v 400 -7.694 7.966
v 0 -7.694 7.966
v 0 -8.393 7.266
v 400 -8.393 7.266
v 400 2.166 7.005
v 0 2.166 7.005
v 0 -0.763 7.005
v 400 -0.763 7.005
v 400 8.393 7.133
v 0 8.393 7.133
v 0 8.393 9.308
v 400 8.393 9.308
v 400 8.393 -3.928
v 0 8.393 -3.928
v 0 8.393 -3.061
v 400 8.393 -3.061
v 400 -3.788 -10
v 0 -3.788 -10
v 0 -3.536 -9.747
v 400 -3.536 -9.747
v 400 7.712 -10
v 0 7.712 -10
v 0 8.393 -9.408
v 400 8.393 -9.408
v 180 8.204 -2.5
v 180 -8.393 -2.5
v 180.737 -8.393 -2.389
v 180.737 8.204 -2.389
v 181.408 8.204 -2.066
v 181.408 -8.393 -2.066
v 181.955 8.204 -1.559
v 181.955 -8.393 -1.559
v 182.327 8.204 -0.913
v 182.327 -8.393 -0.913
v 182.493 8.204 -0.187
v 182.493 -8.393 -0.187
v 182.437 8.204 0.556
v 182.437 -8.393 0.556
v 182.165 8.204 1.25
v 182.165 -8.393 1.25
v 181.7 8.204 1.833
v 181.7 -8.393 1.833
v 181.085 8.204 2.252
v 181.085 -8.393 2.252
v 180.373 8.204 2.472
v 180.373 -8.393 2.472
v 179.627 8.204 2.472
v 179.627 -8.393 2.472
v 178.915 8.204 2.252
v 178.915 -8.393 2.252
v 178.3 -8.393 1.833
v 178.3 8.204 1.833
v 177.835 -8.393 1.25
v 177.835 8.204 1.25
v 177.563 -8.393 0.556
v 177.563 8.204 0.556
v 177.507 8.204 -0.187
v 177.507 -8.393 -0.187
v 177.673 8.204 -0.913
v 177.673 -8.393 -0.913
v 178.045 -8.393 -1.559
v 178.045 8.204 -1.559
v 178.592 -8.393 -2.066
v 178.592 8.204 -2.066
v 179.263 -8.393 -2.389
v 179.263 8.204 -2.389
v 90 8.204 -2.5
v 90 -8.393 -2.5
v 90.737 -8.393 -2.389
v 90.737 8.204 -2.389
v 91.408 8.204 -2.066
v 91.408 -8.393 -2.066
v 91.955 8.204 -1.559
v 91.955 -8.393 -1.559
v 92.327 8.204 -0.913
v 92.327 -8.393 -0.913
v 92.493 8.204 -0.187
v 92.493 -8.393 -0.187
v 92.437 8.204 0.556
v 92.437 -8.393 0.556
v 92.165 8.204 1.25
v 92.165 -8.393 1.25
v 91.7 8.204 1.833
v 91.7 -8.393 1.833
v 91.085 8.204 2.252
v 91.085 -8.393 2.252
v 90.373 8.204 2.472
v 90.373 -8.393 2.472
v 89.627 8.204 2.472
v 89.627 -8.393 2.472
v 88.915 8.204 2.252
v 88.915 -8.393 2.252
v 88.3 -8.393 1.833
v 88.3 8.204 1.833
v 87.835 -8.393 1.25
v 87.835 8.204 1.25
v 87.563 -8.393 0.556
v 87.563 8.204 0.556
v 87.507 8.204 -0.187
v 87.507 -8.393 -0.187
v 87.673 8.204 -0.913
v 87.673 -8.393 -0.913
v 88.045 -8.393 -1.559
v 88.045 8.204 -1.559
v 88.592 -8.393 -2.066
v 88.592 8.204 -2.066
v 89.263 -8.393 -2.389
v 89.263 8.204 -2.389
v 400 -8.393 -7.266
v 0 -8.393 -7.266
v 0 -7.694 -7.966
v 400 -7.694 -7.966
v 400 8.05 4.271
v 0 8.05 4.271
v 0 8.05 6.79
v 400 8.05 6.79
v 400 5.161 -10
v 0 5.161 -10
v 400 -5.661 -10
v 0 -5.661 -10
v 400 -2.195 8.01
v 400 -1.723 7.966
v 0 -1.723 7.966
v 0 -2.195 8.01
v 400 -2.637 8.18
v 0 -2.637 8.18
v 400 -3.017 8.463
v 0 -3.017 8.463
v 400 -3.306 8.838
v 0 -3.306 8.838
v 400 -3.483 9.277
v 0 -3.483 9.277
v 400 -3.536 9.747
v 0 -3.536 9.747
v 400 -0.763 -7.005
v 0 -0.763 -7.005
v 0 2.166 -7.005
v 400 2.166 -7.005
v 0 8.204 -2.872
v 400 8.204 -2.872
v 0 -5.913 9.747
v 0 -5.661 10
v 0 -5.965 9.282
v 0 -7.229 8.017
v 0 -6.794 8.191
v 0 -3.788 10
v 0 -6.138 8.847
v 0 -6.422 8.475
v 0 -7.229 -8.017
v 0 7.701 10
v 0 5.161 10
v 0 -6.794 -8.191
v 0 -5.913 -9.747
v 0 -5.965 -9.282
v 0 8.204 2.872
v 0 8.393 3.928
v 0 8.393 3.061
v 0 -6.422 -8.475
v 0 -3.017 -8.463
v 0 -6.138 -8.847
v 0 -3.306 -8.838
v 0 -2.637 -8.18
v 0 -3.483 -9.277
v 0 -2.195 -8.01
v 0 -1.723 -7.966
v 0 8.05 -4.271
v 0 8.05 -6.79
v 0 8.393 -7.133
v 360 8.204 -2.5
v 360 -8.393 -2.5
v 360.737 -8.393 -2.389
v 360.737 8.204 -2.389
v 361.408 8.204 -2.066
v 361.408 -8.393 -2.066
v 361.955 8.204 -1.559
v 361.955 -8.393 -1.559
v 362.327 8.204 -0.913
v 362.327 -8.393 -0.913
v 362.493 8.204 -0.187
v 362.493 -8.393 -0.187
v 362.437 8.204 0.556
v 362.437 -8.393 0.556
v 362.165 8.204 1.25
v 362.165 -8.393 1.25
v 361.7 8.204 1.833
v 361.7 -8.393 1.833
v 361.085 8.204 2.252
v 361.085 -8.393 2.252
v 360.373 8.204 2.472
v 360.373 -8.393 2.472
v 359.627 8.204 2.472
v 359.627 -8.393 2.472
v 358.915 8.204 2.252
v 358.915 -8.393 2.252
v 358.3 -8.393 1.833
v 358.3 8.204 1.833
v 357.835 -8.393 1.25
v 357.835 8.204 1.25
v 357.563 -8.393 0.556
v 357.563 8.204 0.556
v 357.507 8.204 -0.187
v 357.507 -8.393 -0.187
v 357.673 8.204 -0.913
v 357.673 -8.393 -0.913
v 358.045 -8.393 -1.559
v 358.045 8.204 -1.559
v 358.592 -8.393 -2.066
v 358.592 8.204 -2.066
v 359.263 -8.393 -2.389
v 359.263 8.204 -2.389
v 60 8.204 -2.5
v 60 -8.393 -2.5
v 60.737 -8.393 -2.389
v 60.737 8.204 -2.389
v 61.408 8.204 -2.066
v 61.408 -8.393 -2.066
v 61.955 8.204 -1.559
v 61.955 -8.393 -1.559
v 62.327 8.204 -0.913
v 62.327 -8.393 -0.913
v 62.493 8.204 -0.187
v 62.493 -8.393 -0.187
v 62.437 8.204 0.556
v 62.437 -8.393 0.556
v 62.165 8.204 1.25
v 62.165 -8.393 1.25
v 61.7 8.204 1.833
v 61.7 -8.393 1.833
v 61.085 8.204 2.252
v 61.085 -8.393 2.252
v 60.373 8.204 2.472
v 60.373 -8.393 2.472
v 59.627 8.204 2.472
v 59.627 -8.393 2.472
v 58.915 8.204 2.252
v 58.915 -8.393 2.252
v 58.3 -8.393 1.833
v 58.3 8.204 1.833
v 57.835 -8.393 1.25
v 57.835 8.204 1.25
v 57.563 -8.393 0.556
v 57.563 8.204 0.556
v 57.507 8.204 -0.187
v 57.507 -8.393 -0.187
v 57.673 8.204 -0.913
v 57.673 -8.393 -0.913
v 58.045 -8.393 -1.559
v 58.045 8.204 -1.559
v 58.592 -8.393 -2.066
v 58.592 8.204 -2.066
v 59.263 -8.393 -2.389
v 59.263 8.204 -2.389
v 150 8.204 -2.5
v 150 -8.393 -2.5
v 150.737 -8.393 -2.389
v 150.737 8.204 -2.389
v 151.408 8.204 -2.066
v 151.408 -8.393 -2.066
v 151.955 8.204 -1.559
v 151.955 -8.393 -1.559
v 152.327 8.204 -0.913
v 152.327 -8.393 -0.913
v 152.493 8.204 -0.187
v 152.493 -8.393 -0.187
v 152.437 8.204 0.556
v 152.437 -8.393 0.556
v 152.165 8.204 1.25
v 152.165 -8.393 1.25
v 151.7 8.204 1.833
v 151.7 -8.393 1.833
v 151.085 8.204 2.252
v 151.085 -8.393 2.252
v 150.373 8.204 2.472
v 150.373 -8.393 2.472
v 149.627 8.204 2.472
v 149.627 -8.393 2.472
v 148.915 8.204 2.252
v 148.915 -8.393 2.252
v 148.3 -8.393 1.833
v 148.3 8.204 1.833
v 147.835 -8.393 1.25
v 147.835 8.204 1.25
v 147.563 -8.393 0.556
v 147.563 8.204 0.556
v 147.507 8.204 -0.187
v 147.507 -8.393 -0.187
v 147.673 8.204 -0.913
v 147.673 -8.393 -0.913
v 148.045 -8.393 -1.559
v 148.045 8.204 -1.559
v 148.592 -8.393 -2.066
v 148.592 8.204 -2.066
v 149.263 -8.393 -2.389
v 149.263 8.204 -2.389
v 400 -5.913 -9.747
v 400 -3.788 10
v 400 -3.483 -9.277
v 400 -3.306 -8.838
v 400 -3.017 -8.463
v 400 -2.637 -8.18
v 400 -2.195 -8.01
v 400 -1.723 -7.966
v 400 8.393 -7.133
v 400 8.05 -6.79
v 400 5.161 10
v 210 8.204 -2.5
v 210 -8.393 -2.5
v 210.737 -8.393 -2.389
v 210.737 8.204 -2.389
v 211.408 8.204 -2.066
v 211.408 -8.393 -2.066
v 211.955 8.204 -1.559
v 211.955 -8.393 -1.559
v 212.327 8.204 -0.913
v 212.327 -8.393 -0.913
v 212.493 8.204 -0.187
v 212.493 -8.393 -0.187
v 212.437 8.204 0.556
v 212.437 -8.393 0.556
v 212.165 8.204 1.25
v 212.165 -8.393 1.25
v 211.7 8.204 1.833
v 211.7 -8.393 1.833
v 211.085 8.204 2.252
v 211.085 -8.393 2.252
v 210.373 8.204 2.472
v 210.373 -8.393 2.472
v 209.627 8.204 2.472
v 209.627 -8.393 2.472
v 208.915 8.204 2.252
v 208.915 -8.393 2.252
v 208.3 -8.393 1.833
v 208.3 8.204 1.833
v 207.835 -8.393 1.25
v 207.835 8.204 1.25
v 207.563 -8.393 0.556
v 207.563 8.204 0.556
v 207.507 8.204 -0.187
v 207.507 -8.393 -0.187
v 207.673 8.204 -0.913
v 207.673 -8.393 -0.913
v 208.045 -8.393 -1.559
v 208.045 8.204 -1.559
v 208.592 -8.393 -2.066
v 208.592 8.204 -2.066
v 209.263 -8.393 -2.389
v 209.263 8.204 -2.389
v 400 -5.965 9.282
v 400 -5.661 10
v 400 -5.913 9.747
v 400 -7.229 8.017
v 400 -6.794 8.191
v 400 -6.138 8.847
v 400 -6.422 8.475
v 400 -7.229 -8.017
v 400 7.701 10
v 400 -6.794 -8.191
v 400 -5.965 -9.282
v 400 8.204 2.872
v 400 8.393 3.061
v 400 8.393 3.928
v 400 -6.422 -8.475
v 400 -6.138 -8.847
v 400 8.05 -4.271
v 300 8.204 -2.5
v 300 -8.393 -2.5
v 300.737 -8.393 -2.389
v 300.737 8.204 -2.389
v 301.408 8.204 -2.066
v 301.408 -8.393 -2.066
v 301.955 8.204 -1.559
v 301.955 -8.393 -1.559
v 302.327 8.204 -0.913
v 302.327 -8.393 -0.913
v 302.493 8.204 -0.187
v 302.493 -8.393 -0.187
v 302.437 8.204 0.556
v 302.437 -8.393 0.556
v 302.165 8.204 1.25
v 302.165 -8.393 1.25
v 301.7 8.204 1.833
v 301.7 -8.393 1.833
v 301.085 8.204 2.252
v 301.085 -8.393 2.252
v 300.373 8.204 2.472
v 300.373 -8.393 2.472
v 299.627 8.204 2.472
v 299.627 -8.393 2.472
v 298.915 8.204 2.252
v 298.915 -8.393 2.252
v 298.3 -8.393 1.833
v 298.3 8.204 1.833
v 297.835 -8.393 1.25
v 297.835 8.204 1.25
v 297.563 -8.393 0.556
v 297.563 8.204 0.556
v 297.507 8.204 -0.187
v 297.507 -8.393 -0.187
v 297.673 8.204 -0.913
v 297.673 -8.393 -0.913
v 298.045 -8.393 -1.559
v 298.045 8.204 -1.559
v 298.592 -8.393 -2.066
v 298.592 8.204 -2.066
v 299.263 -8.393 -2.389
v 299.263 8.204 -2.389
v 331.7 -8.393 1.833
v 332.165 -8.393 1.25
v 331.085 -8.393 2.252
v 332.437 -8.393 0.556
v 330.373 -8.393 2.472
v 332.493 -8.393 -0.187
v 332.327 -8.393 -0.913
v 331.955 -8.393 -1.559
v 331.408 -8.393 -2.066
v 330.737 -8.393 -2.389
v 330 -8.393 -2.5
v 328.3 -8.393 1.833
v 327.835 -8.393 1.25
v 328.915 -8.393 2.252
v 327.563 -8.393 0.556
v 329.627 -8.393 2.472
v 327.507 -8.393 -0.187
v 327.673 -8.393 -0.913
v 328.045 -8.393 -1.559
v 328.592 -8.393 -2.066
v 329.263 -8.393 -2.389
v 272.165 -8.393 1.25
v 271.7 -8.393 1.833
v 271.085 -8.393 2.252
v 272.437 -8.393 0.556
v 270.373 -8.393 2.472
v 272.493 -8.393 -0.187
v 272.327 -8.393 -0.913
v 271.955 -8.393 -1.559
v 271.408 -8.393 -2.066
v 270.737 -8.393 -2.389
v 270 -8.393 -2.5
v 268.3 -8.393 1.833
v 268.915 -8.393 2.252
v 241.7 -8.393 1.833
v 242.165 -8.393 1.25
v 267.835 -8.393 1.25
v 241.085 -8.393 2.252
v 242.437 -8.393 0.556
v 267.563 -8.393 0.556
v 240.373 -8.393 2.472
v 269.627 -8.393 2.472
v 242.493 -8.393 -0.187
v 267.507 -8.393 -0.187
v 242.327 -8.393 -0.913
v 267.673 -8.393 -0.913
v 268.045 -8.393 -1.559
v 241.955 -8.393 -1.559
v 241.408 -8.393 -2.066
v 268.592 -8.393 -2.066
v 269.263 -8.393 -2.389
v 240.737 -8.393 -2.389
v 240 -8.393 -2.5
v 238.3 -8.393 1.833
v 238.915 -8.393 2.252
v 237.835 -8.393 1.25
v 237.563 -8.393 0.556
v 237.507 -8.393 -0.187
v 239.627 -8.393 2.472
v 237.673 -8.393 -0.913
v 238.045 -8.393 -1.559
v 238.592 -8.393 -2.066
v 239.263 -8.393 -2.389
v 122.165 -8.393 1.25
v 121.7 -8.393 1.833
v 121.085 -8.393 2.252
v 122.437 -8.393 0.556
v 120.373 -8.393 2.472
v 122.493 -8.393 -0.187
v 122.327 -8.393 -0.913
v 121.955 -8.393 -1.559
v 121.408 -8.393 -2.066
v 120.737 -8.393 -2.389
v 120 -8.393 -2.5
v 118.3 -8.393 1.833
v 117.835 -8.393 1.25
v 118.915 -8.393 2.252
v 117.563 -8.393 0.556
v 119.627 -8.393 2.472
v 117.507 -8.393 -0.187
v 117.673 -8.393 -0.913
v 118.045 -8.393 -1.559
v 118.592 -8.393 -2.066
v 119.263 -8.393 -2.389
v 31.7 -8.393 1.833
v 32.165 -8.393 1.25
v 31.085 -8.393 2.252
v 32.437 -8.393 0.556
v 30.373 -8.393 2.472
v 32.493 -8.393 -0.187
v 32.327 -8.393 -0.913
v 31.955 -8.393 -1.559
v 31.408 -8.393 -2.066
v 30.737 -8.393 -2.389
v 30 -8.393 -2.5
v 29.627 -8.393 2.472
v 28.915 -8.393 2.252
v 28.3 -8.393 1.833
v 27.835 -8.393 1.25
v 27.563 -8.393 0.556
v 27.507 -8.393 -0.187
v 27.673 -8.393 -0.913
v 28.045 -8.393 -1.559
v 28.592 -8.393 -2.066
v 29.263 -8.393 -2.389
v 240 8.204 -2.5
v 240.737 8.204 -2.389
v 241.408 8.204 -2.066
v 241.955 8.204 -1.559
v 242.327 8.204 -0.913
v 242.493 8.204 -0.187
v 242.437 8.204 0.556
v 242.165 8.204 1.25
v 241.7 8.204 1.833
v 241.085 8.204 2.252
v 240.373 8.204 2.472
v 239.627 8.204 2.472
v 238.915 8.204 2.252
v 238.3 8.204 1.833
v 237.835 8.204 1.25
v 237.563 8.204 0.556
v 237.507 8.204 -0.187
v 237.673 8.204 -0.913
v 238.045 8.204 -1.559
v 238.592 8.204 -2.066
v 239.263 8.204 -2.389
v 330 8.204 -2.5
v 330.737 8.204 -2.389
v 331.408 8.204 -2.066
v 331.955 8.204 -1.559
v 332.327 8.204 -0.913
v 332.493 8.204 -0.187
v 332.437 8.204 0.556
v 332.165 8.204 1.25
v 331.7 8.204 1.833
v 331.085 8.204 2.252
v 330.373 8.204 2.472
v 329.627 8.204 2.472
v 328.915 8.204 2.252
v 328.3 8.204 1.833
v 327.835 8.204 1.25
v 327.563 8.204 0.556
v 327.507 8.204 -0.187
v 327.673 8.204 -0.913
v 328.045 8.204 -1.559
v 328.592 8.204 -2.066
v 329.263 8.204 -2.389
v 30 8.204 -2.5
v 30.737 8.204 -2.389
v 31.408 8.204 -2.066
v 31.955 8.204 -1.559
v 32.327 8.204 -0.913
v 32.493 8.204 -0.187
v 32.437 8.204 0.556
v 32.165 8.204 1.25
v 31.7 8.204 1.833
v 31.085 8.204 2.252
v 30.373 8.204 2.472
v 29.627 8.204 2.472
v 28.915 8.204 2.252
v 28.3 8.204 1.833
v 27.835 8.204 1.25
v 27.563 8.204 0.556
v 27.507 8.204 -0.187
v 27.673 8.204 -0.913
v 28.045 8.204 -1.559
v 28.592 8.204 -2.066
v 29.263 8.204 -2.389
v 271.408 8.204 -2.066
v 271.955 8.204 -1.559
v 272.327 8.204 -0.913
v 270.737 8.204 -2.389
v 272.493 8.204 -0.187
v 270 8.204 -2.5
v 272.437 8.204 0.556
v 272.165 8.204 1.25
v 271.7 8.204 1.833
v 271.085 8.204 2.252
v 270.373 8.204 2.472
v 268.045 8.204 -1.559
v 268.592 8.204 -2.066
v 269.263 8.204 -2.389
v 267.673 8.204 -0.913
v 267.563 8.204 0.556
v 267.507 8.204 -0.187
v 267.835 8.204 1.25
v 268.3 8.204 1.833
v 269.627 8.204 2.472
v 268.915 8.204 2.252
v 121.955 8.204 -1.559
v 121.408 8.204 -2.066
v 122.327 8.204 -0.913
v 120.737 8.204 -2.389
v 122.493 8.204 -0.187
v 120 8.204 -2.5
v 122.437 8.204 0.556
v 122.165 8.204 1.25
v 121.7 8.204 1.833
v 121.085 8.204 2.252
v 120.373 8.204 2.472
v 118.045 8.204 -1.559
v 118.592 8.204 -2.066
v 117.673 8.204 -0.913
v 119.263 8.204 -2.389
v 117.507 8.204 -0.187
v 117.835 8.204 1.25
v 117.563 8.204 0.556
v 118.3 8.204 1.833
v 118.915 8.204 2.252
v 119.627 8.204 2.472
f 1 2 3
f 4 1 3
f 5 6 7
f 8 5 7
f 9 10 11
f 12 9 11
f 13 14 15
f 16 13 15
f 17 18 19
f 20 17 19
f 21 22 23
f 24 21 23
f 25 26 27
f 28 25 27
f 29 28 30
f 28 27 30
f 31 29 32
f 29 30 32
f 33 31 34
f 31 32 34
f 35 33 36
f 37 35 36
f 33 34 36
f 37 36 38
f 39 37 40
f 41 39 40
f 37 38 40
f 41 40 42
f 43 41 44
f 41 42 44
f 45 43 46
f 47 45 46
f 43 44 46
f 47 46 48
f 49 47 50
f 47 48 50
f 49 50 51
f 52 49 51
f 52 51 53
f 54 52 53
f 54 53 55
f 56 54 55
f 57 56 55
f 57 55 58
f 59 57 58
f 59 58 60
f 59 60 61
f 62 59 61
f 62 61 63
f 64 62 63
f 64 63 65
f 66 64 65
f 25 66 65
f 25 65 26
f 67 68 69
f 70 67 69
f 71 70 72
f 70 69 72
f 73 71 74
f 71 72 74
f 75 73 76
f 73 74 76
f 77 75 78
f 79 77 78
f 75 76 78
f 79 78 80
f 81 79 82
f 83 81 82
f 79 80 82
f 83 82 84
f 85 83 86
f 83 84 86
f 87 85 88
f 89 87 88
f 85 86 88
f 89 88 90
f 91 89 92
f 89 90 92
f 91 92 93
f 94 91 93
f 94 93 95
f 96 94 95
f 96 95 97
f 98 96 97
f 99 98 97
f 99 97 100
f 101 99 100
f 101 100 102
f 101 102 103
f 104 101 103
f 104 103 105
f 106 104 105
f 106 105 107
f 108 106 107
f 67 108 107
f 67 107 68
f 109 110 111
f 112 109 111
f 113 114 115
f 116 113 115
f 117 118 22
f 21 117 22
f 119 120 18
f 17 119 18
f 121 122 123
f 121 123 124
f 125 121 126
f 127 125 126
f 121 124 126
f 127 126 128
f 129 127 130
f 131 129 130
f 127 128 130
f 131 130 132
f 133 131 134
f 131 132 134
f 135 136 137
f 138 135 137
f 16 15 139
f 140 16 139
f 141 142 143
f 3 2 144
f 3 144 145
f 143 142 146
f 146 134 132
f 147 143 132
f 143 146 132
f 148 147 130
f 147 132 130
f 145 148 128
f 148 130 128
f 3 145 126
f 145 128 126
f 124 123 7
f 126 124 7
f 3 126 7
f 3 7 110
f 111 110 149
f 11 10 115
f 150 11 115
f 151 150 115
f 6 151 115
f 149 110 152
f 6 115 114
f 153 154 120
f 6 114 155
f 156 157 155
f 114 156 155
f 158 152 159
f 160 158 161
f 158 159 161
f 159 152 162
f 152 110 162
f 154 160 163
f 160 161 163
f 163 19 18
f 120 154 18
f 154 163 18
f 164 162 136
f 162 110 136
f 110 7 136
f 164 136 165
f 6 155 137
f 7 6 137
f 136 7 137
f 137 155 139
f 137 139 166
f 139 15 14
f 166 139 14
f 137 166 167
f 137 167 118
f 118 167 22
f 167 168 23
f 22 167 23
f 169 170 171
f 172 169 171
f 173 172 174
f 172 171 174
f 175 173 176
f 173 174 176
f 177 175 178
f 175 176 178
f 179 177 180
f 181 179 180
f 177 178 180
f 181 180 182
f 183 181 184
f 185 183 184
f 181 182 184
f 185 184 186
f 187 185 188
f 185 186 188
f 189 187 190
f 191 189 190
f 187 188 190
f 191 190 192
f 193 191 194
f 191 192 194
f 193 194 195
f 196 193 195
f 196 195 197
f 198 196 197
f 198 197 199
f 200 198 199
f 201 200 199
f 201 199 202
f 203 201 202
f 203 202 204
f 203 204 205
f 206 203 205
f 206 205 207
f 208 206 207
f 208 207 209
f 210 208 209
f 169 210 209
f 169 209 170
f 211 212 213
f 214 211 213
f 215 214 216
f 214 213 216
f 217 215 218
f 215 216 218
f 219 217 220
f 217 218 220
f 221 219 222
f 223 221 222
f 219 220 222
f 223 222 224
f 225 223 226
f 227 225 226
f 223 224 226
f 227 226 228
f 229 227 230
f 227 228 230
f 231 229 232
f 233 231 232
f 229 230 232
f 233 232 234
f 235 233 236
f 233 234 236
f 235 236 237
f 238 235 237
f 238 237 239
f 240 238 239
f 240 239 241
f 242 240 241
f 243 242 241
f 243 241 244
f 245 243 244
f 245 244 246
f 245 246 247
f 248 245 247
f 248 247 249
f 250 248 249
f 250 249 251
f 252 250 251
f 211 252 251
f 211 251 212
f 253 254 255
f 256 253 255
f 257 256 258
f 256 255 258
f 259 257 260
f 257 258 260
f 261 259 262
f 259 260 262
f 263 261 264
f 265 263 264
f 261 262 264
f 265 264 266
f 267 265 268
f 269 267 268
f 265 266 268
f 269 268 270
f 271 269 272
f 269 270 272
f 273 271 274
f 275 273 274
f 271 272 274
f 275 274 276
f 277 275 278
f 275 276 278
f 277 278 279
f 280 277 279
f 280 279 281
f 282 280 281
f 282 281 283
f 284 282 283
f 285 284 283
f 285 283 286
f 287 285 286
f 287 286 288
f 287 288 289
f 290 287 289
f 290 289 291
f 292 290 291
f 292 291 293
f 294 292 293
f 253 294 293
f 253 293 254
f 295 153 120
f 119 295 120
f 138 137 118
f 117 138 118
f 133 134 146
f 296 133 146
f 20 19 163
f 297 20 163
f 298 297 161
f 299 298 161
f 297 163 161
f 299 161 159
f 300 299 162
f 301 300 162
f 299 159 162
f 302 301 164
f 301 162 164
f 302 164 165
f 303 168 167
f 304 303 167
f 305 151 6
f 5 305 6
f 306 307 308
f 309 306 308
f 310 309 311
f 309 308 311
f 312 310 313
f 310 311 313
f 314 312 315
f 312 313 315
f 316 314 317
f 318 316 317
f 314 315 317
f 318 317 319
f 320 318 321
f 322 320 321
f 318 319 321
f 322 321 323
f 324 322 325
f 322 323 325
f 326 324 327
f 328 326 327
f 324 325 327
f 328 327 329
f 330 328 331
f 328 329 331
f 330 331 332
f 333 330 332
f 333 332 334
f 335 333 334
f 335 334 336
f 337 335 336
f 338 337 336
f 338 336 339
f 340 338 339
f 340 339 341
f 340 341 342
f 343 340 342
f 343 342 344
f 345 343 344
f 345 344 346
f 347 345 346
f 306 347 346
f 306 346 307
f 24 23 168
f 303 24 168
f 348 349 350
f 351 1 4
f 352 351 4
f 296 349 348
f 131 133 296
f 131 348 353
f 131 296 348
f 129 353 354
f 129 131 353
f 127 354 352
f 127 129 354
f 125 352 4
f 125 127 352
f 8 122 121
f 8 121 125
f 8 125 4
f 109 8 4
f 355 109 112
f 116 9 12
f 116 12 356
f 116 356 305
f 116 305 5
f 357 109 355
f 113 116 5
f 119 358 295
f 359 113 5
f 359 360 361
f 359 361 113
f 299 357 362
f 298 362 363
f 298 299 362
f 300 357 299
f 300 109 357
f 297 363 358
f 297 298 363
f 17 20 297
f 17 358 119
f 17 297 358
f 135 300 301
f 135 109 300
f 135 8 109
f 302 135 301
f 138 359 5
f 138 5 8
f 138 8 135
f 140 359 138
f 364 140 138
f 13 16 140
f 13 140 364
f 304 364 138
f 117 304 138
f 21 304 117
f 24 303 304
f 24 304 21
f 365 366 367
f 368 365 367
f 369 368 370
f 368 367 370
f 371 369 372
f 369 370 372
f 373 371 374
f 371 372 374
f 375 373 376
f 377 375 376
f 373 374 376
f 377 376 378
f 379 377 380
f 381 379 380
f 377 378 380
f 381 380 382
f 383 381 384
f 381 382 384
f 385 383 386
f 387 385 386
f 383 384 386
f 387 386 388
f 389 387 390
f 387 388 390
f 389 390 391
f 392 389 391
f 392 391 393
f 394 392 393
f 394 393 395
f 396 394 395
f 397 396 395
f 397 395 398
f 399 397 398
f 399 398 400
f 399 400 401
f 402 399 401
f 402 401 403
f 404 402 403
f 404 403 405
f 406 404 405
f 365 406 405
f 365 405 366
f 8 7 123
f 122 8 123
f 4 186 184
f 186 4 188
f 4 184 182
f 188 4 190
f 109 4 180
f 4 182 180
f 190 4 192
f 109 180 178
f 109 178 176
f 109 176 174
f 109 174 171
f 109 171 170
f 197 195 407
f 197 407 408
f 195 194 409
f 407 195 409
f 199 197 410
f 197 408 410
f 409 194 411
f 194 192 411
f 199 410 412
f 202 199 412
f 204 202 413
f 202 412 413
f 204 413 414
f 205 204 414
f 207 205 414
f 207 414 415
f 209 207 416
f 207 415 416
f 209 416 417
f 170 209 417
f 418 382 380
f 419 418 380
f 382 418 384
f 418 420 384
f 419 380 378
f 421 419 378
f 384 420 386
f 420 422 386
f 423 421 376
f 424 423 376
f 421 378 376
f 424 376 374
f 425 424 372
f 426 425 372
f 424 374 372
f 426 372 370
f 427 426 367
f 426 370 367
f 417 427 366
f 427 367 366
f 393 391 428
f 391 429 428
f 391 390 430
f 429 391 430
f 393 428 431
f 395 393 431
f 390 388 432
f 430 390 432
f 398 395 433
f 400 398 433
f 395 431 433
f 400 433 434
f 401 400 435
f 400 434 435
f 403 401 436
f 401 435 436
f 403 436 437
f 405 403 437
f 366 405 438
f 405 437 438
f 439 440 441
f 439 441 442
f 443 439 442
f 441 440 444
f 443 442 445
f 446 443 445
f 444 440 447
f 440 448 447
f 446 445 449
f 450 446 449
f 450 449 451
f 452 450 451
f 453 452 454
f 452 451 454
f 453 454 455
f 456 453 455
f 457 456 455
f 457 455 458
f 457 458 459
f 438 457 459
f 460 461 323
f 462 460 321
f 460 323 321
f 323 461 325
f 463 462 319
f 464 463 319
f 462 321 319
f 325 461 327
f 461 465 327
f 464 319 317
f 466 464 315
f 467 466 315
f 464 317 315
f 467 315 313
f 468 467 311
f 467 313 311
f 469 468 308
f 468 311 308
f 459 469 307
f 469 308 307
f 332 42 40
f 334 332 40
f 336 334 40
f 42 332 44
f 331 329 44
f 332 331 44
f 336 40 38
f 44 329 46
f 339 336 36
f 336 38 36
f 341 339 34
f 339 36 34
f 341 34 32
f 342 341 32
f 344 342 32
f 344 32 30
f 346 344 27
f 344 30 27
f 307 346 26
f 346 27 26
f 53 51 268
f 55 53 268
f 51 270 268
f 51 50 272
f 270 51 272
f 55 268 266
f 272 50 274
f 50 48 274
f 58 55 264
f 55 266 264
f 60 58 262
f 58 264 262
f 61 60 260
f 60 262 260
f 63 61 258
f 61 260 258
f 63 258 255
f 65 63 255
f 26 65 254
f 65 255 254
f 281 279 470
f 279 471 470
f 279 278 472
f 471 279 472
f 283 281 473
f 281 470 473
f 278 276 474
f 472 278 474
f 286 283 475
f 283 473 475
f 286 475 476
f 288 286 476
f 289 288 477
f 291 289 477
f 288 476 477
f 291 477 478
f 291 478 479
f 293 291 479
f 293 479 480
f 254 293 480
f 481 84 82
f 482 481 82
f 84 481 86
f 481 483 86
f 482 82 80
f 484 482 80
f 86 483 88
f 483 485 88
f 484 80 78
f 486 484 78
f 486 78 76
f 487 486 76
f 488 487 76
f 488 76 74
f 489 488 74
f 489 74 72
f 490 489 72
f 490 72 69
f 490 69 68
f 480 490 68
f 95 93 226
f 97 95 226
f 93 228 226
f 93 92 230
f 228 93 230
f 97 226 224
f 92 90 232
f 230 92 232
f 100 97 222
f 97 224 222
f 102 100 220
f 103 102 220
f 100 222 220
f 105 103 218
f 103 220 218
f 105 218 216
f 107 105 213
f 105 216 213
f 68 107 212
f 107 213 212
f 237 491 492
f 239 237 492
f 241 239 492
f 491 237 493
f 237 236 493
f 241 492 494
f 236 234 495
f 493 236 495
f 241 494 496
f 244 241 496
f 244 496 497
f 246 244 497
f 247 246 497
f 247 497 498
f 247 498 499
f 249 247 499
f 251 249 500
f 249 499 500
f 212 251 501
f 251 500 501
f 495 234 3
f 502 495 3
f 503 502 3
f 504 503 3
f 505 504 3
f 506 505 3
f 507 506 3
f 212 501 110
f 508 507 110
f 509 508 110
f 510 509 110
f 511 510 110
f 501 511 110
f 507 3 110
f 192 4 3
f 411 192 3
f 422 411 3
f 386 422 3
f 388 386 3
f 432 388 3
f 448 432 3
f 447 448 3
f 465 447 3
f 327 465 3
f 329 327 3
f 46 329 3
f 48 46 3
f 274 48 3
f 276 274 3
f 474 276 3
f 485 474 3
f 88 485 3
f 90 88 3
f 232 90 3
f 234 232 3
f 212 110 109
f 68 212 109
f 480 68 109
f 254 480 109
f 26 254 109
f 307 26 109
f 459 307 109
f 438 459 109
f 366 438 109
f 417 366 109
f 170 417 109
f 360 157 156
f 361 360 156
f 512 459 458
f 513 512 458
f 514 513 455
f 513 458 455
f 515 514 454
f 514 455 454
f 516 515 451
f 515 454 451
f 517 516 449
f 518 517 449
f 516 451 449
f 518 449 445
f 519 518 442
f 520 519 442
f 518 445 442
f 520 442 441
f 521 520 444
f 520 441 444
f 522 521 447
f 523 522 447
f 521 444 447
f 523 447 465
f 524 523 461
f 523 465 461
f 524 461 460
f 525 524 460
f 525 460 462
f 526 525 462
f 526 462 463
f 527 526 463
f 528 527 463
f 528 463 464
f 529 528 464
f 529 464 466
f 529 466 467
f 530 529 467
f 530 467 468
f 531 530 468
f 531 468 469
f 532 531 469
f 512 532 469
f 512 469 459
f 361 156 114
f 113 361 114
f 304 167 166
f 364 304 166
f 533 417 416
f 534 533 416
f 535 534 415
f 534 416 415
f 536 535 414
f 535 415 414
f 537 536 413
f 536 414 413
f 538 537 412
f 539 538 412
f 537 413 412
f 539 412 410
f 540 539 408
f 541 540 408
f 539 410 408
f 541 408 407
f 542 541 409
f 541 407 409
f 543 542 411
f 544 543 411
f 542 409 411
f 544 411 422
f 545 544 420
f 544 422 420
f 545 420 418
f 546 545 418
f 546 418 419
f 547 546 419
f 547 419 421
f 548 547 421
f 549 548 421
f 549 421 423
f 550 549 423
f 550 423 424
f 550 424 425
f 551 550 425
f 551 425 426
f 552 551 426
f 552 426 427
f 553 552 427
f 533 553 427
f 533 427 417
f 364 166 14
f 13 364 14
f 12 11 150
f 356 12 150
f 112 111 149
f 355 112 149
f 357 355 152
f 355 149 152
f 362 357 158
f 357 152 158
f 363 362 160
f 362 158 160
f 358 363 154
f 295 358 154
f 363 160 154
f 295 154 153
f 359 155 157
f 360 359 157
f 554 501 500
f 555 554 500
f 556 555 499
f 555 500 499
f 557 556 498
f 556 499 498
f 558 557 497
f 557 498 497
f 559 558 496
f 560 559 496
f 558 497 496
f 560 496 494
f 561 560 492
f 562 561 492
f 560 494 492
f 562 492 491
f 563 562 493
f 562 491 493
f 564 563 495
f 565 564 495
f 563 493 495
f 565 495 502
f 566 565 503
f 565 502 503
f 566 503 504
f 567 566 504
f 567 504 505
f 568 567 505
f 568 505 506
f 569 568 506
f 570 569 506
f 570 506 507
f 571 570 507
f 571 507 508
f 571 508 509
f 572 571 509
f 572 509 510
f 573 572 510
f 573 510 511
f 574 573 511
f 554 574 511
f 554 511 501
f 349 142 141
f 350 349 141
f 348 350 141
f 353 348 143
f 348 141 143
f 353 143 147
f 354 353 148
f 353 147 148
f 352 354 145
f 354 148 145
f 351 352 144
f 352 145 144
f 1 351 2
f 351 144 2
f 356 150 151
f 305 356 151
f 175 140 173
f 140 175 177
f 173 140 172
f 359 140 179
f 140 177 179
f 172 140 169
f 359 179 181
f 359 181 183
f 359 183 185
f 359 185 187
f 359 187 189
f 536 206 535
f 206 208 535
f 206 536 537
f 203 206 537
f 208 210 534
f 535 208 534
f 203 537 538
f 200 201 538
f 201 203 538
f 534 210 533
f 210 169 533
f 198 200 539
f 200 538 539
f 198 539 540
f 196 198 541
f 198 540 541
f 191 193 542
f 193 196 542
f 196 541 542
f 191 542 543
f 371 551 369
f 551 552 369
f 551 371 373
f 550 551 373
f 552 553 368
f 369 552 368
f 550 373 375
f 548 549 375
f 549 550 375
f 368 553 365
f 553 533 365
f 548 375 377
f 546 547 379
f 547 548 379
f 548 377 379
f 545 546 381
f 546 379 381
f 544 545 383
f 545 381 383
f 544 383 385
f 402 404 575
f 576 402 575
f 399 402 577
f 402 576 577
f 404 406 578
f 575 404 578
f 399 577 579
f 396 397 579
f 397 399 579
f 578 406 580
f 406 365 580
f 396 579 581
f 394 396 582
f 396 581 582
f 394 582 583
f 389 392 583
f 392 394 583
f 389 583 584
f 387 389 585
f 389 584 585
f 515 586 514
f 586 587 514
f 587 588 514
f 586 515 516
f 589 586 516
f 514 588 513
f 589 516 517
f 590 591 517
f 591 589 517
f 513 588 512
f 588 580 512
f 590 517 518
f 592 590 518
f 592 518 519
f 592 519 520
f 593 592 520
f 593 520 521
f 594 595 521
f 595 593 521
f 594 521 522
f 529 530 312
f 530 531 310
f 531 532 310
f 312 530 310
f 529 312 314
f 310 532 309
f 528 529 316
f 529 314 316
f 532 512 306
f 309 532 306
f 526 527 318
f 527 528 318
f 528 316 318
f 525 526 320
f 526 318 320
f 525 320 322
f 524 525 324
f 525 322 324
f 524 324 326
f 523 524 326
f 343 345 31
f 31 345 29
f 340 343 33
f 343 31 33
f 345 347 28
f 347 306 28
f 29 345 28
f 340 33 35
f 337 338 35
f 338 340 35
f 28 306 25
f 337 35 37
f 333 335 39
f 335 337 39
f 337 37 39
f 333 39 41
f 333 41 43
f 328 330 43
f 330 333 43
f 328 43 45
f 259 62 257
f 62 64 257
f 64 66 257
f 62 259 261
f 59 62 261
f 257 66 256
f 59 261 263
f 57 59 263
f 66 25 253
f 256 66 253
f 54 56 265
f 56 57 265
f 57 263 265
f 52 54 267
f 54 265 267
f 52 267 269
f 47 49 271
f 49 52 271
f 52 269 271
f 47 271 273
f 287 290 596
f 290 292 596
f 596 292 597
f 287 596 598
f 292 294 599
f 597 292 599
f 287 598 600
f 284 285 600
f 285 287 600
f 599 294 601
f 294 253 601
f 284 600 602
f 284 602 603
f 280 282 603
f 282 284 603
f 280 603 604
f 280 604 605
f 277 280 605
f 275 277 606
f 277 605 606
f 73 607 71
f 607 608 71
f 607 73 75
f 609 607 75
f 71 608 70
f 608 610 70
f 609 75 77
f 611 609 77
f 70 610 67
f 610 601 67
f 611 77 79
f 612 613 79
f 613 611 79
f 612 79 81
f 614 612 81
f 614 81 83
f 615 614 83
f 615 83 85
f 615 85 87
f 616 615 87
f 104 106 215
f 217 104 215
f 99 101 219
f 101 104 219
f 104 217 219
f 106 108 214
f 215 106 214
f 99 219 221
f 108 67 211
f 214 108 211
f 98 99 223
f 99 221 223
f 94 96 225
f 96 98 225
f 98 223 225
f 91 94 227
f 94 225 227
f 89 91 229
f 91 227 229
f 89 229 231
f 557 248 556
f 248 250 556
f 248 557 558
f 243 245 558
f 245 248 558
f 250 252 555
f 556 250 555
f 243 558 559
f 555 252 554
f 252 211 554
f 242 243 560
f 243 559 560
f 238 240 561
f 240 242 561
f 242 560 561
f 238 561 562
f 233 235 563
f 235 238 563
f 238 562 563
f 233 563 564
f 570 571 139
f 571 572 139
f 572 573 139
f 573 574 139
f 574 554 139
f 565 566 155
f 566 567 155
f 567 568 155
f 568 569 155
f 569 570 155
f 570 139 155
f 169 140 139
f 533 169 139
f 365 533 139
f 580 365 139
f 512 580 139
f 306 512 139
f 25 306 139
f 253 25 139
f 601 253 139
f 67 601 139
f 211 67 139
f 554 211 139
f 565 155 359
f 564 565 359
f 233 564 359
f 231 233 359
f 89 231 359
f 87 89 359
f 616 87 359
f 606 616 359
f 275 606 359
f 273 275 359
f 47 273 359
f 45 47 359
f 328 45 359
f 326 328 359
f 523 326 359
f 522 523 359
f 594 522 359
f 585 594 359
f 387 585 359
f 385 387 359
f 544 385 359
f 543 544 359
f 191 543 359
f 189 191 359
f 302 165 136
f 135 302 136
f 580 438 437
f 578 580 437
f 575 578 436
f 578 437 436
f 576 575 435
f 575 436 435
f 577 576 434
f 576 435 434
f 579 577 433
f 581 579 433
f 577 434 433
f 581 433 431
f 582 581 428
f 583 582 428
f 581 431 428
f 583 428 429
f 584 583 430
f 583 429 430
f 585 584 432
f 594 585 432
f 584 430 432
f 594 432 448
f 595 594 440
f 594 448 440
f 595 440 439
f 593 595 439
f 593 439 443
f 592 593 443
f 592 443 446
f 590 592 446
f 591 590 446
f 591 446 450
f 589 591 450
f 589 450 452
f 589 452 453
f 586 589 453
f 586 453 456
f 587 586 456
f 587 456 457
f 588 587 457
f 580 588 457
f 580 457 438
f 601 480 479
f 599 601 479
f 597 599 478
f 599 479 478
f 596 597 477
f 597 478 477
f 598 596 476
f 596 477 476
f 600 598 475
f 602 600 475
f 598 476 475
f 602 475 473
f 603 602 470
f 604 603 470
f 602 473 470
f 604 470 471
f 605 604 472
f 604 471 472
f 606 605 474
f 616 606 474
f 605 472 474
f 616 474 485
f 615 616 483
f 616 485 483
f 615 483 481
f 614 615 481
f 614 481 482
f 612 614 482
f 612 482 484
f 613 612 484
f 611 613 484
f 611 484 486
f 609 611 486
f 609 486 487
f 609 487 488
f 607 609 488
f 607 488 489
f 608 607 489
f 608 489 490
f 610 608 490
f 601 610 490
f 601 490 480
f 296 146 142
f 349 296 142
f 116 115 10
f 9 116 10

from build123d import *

# Parameters (mm, degrees)
BOSS_EXTRUDE1_DEPTH   = 400
CROQUIS1_R            = 2.5
CORTAR_EXTRUIR1_DEPTH = 401.476966357


with BuildPart() as part:
    # Sketch1 → Boss-Extrude1 (new body)
    with BuildSketch(Plane(origin=(0, 0, 0), x_dir=(0, 0, -1), z_dir=(1, 0, 0))):
        with BuildLine():
            Line((-7.965754986, -7.693975449), (-7.266272068, -8.393458366))
            Line((-7.266272068, -8.393458366), (7.266272068, -8.393458366))
            Line((7.266272068, -8.393458366), (7.965754986, -7.693975449))
            ThreePointArc((7.965754986, -7.693975449), (8.474723757, -6.421557866), (9.747437917, -5.913331162))
            Line((9.747437917, -5.913331162), (10.000000437, -5.660768637))
            Line((10.000000437, -5.660768637), (10.000000437, -3.788406023))
            Line((10.000000437, -3.788406023), (9.747437912, -3.535843503))
            ThreePointArc((9.747437912, -3.535843503), (8.462742055, -3.016656911), (7.965755402, -1.72321096))
            Line((7.965755402, -1.72321096), (7.005148341, -0.762603918))
            Line((7.005148341, -0.762603918), (7.005148341, 2.166206023))
            Line((7.005148341, 2.166206023), (10.000000347, 5.161058089))
            Line((10.000000347, 5.161058089), (10.000000347, 7.712387211))
            Line((10.000000347, 7.712387211), (9.408464779, 8.393458268))
            Line((9.408464779, 8.393458268), (7.133016457, 8.393458268))
            Line((7.133016457, 8.393458268), (6.789534443, 8.049976247))
            Line((6.789534443, 8.049976247), (4.271139656, 8.049976247))
            Line((4.271139656, 8.049976247), (3.927707784, 8.393458265))
            Line((3.927707784, 8.393458265), (3.061282509, 8.393458265))
            Line((3.061282509, 8.393458265), (2.872049327, 8.204225079))
            Line((2.872049327, 8.204225079), (-2.87204886, 8.204225079))
            Line((-2.87204886, 8.204225079), (-3.061282046, 8.393458261))
            Line((-3.061282046, 8.393458261), (-3.927707321, 8.393458261))
            Line((-3.927707321, 8.393458261), (-4.271189216, 8.049976359))
            Line((-4.271189216, 8.049976359), (-6.789534095, 8.049976359))
            Line((-6.789534095, 8.049976359), (-7.133016116, 8.393458373))
            Line((-7.133016116, 8.393458373), (-9.30771733, 8.393458373))
            Line((-9.30771733, 8.393458373), (-10, 7.70117569))
            Line((-10, 7.70117569), (-10, 5.161058187))
            Line((-10, 5.161058187), (-7.005147934, 2.166206181))
            Line((-7.005147934, 2.166206181), (-7.005147934, -0.76260376))
            Line((-7.005147934, -0.76260376), (-7.965754986, -1.723210812))
            ThreePointArc((-7.965754986, -1.723210812), (-8.462741848, -3.016656549), (-9.747437477, -3.535843372))
            Line((-9.747437477, -3.535843372), (-10, -3.788405895))
            Line((-10, -3.788405895), (-10, -5.660768509))
            Line((-10, -5.660768509), (-9.747437477, -5.913331032))
            ThreePointArc((-9.747437477, -5.913331032), (-8.474723558, -6.421557943), (-7.965754986, -7.693975449))
        make_face()
    extrude(amount=BOSS_EXTRUDE1_DEPTH)

    # Croquis1 → Cortar-Extruir1 (cut, through all)
    with BuildSketch(Plane.XZ.offset(8.393458366)):
        with Locations(Location((30, 0, 0), (0, 0, 270))):
            Circle(CROQUIS1_R)
        with Locations(Location((60, 0, 0), (0, 0, 270))):
            Circle(CROQUIS1_R)
        with Locations(Location((90, 0, 0), (0, 0, 270))):
            Circle(CROQUIS1_R)
        with Locations(Location((120, 0, 0), (0, 0, 270))):
            Circle(CROQUIS1_R)
        with Locations(Location((150, 0, 0), (0, 0, 270))):
            Circle(CROQUIS1_R)
        with Locations(Location((180, 0, 0), (0, 0, 270))):
            Circle(CROQUIS1_R)
        with Locations(Location((210, 0, 0), (0, 0, 270))):
            Circle(CROQUIS1_R)
        with Locations(Location((240, 0, 0), (0, 0, 270))):
            Circle(CROQUIS1_R)
        with Locations(Location((270, 0, 0), (0, 0, 270))):
            Circle(CROQUIS1_R)
        with Locations(Location((300, 0, 0), (0, 0, 270))):
            Circle(CROQUIS1_R)
        with Locations(Location((330, 0, 0), (0, 0, 270))):
            Circle(CROQUIS1_R)
        with Locations(Location((360, 0, 0), (0, 0, 270))):
            Circle(CROQUIS1_R)
    extrude(amount=-CORTAR_EXTRUIR1_DEPTH, mode=Mode.SUBTRACT)


solid = part.part
